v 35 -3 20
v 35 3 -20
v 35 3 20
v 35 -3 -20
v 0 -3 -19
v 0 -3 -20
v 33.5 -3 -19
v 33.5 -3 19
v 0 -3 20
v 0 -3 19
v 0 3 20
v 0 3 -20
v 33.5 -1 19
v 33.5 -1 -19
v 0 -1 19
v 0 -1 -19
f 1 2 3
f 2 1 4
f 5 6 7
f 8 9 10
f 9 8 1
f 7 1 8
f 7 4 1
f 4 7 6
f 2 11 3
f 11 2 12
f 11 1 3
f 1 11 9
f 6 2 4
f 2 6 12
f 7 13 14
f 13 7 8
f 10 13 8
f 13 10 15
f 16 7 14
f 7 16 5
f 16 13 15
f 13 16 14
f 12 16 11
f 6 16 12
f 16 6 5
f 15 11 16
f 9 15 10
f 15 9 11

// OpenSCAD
// file: battery.scad
module akkum16850(){
    rotate([0,90,0])
    difference(){
        color("orange")
        cylinder(d = 18,h = 62,center = true);
        
        translate([0,0,31])
        color("gray")
        circle(d = 16);
        
        translate([0,0,-30.5])
        color("lightgray")
        circle(d = 16);
        
    }
    rotate([0,90,0])
    translate([0,0,30.6])
    color("lightgray")
    circle(d = 13);
    rotate([0,90,0])
    translate([0,0,31.3])
    color("white")
    circle(d = 5);
    
    rotate([0,90,0])
    translate([0,0,-30.4])
    color("lightgray")
    circle(d = 15);
}
akkum16850();
// main file
use <battery.scad>

module table(){

    rotate([90,0,0])
    difference(){
        cube([70,40,6],center = true);
        translate([0,0,2.1])
        cube([67,38,3],center = true);
    }
    rotate([90,0,0])
    cube([67,38,2],center = true);
}

module retable(){
    difference(){
        table();
        rotate([90,0,0])
        translate([-34,0,0])
        cube([68,41,7],center = true);
    }
}
retable();
